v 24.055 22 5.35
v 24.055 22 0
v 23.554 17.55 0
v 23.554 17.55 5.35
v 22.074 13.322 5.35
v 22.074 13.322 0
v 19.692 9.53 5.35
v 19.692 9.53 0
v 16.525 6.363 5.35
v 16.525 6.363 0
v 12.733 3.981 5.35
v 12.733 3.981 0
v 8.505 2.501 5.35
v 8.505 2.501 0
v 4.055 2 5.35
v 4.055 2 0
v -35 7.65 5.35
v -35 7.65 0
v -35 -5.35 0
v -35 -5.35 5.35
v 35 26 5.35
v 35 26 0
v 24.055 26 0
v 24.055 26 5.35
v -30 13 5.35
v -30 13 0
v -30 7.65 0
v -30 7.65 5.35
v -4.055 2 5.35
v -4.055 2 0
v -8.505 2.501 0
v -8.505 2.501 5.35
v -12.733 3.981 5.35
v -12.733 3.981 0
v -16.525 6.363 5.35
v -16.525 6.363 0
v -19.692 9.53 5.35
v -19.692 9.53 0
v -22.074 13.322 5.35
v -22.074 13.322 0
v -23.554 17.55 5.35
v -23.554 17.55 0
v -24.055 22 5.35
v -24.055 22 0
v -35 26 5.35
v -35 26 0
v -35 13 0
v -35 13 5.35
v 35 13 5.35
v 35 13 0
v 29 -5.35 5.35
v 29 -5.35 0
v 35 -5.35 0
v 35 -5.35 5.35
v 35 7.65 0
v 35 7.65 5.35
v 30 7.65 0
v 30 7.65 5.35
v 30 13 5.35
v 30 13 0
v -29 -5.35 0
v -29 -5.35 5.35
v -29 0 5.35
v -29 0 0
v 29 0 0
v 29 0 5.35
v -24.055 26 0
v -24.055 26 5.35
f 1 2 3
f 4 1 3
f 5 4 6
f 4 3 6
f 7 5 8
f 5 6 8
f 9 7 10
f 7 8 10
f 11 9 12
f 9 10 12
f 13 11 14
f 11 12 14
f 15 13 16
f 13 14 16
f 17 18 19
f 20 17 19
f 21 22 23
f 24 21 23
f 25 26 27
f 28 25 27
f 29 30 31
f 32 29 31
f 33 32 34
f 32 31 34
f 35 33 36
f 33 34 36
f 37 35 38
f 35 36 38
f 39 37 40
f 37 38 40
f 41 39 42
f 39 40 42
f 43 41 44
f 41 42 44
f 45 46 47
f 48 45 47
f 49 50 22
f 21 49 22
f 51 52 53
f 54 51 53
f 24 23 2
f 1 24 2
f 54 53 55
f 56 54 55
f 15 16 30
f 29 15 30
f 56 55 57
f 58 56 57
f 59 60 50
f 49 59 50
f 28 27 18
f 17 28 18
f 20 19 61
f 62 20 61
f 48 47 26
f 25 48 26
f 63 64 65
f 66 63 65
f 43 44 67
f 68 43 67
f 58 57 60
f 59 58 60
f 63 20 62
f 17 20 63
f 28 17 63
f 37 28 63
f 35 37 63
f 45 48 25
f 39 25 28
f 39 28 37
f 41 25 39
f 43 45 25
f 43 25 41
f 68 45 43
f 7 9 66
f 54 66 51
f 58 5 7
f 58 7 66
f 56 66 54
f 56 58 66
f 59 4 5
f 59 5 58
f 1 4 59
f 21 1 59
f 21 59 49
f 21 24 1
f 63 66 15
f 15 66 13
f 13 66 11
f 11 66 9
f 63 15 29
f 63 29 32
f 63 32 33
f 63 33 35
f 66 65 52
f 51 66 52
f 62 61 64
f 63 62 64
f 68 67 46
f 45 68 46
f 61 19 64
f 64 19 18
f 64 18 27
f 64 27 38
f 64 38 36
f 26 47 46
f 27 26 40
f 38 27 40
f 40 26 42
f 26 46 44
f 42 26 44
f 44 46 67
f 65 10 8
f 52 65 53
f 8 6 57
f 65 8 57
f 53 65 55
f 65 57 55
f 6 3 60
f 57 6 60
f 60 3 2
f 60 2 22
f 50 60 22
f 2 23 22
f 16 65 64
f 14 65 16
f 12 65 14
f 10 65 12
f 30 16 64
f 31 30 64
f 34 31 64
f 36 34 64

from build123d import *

# Parameters (mm, degrees)
BOSS_EXTRUDE1_DEPTH = 5.35


with BuildPart() as part:
    # Model → Boss-Extrude1 (new body)
    with BuildSketch(Plane.XY):
        with BuildLine():
            Line((-29, 0), (29, 0))
            Line((29, 0), (29, -5.35))
            Line((29, -5.35), (35, -5.35))
            Line((35, -5.35), (35, -2.50087083))
            Line((35, -2.50087083), (35, 7.65))
            Line((35, 7.65), (30, 7.65))
            Line((30, 7.65), (30, 13))
            Line((30, 13), (35, 13))
            Line((35, 13), (35, 26))
            Line((35, 26), (24.055, 26))
            Line((24.055, 26), (24.055, 22))
            ThreePointArc((24.055, 22), (18.197135624, 7.857864376), (4.055, 2))
            Line((4.055, 2), (-4.055, 2))
            ThreePointArc((-4.055, 2), (-18.197135624, 7.857864376), (-24.055, 22))
            Line((-24.055, 22), (-24.055, 26))
            Line((-24.055, 26), (-35, 26))
            Line((-35, 26), (-35, 13))
            Line((-35, 13), (-30, 13))
            Line((-30, 13), (-30, 7.65))
            Line((-30, 7.65), (-35, 7.65))
            Line((-35, 7.65), (-35, -2.50087083))
            Line((-35, -2.50087083), (-35, -5.35))
            Line((-35, -5.35), (-29, -5.35))
            Line((-29, -5.35), (-29, 0))
        make_face()
    extrude(amount=BOSS_EXTRUDE1_DEPTH)


solid = part.part
